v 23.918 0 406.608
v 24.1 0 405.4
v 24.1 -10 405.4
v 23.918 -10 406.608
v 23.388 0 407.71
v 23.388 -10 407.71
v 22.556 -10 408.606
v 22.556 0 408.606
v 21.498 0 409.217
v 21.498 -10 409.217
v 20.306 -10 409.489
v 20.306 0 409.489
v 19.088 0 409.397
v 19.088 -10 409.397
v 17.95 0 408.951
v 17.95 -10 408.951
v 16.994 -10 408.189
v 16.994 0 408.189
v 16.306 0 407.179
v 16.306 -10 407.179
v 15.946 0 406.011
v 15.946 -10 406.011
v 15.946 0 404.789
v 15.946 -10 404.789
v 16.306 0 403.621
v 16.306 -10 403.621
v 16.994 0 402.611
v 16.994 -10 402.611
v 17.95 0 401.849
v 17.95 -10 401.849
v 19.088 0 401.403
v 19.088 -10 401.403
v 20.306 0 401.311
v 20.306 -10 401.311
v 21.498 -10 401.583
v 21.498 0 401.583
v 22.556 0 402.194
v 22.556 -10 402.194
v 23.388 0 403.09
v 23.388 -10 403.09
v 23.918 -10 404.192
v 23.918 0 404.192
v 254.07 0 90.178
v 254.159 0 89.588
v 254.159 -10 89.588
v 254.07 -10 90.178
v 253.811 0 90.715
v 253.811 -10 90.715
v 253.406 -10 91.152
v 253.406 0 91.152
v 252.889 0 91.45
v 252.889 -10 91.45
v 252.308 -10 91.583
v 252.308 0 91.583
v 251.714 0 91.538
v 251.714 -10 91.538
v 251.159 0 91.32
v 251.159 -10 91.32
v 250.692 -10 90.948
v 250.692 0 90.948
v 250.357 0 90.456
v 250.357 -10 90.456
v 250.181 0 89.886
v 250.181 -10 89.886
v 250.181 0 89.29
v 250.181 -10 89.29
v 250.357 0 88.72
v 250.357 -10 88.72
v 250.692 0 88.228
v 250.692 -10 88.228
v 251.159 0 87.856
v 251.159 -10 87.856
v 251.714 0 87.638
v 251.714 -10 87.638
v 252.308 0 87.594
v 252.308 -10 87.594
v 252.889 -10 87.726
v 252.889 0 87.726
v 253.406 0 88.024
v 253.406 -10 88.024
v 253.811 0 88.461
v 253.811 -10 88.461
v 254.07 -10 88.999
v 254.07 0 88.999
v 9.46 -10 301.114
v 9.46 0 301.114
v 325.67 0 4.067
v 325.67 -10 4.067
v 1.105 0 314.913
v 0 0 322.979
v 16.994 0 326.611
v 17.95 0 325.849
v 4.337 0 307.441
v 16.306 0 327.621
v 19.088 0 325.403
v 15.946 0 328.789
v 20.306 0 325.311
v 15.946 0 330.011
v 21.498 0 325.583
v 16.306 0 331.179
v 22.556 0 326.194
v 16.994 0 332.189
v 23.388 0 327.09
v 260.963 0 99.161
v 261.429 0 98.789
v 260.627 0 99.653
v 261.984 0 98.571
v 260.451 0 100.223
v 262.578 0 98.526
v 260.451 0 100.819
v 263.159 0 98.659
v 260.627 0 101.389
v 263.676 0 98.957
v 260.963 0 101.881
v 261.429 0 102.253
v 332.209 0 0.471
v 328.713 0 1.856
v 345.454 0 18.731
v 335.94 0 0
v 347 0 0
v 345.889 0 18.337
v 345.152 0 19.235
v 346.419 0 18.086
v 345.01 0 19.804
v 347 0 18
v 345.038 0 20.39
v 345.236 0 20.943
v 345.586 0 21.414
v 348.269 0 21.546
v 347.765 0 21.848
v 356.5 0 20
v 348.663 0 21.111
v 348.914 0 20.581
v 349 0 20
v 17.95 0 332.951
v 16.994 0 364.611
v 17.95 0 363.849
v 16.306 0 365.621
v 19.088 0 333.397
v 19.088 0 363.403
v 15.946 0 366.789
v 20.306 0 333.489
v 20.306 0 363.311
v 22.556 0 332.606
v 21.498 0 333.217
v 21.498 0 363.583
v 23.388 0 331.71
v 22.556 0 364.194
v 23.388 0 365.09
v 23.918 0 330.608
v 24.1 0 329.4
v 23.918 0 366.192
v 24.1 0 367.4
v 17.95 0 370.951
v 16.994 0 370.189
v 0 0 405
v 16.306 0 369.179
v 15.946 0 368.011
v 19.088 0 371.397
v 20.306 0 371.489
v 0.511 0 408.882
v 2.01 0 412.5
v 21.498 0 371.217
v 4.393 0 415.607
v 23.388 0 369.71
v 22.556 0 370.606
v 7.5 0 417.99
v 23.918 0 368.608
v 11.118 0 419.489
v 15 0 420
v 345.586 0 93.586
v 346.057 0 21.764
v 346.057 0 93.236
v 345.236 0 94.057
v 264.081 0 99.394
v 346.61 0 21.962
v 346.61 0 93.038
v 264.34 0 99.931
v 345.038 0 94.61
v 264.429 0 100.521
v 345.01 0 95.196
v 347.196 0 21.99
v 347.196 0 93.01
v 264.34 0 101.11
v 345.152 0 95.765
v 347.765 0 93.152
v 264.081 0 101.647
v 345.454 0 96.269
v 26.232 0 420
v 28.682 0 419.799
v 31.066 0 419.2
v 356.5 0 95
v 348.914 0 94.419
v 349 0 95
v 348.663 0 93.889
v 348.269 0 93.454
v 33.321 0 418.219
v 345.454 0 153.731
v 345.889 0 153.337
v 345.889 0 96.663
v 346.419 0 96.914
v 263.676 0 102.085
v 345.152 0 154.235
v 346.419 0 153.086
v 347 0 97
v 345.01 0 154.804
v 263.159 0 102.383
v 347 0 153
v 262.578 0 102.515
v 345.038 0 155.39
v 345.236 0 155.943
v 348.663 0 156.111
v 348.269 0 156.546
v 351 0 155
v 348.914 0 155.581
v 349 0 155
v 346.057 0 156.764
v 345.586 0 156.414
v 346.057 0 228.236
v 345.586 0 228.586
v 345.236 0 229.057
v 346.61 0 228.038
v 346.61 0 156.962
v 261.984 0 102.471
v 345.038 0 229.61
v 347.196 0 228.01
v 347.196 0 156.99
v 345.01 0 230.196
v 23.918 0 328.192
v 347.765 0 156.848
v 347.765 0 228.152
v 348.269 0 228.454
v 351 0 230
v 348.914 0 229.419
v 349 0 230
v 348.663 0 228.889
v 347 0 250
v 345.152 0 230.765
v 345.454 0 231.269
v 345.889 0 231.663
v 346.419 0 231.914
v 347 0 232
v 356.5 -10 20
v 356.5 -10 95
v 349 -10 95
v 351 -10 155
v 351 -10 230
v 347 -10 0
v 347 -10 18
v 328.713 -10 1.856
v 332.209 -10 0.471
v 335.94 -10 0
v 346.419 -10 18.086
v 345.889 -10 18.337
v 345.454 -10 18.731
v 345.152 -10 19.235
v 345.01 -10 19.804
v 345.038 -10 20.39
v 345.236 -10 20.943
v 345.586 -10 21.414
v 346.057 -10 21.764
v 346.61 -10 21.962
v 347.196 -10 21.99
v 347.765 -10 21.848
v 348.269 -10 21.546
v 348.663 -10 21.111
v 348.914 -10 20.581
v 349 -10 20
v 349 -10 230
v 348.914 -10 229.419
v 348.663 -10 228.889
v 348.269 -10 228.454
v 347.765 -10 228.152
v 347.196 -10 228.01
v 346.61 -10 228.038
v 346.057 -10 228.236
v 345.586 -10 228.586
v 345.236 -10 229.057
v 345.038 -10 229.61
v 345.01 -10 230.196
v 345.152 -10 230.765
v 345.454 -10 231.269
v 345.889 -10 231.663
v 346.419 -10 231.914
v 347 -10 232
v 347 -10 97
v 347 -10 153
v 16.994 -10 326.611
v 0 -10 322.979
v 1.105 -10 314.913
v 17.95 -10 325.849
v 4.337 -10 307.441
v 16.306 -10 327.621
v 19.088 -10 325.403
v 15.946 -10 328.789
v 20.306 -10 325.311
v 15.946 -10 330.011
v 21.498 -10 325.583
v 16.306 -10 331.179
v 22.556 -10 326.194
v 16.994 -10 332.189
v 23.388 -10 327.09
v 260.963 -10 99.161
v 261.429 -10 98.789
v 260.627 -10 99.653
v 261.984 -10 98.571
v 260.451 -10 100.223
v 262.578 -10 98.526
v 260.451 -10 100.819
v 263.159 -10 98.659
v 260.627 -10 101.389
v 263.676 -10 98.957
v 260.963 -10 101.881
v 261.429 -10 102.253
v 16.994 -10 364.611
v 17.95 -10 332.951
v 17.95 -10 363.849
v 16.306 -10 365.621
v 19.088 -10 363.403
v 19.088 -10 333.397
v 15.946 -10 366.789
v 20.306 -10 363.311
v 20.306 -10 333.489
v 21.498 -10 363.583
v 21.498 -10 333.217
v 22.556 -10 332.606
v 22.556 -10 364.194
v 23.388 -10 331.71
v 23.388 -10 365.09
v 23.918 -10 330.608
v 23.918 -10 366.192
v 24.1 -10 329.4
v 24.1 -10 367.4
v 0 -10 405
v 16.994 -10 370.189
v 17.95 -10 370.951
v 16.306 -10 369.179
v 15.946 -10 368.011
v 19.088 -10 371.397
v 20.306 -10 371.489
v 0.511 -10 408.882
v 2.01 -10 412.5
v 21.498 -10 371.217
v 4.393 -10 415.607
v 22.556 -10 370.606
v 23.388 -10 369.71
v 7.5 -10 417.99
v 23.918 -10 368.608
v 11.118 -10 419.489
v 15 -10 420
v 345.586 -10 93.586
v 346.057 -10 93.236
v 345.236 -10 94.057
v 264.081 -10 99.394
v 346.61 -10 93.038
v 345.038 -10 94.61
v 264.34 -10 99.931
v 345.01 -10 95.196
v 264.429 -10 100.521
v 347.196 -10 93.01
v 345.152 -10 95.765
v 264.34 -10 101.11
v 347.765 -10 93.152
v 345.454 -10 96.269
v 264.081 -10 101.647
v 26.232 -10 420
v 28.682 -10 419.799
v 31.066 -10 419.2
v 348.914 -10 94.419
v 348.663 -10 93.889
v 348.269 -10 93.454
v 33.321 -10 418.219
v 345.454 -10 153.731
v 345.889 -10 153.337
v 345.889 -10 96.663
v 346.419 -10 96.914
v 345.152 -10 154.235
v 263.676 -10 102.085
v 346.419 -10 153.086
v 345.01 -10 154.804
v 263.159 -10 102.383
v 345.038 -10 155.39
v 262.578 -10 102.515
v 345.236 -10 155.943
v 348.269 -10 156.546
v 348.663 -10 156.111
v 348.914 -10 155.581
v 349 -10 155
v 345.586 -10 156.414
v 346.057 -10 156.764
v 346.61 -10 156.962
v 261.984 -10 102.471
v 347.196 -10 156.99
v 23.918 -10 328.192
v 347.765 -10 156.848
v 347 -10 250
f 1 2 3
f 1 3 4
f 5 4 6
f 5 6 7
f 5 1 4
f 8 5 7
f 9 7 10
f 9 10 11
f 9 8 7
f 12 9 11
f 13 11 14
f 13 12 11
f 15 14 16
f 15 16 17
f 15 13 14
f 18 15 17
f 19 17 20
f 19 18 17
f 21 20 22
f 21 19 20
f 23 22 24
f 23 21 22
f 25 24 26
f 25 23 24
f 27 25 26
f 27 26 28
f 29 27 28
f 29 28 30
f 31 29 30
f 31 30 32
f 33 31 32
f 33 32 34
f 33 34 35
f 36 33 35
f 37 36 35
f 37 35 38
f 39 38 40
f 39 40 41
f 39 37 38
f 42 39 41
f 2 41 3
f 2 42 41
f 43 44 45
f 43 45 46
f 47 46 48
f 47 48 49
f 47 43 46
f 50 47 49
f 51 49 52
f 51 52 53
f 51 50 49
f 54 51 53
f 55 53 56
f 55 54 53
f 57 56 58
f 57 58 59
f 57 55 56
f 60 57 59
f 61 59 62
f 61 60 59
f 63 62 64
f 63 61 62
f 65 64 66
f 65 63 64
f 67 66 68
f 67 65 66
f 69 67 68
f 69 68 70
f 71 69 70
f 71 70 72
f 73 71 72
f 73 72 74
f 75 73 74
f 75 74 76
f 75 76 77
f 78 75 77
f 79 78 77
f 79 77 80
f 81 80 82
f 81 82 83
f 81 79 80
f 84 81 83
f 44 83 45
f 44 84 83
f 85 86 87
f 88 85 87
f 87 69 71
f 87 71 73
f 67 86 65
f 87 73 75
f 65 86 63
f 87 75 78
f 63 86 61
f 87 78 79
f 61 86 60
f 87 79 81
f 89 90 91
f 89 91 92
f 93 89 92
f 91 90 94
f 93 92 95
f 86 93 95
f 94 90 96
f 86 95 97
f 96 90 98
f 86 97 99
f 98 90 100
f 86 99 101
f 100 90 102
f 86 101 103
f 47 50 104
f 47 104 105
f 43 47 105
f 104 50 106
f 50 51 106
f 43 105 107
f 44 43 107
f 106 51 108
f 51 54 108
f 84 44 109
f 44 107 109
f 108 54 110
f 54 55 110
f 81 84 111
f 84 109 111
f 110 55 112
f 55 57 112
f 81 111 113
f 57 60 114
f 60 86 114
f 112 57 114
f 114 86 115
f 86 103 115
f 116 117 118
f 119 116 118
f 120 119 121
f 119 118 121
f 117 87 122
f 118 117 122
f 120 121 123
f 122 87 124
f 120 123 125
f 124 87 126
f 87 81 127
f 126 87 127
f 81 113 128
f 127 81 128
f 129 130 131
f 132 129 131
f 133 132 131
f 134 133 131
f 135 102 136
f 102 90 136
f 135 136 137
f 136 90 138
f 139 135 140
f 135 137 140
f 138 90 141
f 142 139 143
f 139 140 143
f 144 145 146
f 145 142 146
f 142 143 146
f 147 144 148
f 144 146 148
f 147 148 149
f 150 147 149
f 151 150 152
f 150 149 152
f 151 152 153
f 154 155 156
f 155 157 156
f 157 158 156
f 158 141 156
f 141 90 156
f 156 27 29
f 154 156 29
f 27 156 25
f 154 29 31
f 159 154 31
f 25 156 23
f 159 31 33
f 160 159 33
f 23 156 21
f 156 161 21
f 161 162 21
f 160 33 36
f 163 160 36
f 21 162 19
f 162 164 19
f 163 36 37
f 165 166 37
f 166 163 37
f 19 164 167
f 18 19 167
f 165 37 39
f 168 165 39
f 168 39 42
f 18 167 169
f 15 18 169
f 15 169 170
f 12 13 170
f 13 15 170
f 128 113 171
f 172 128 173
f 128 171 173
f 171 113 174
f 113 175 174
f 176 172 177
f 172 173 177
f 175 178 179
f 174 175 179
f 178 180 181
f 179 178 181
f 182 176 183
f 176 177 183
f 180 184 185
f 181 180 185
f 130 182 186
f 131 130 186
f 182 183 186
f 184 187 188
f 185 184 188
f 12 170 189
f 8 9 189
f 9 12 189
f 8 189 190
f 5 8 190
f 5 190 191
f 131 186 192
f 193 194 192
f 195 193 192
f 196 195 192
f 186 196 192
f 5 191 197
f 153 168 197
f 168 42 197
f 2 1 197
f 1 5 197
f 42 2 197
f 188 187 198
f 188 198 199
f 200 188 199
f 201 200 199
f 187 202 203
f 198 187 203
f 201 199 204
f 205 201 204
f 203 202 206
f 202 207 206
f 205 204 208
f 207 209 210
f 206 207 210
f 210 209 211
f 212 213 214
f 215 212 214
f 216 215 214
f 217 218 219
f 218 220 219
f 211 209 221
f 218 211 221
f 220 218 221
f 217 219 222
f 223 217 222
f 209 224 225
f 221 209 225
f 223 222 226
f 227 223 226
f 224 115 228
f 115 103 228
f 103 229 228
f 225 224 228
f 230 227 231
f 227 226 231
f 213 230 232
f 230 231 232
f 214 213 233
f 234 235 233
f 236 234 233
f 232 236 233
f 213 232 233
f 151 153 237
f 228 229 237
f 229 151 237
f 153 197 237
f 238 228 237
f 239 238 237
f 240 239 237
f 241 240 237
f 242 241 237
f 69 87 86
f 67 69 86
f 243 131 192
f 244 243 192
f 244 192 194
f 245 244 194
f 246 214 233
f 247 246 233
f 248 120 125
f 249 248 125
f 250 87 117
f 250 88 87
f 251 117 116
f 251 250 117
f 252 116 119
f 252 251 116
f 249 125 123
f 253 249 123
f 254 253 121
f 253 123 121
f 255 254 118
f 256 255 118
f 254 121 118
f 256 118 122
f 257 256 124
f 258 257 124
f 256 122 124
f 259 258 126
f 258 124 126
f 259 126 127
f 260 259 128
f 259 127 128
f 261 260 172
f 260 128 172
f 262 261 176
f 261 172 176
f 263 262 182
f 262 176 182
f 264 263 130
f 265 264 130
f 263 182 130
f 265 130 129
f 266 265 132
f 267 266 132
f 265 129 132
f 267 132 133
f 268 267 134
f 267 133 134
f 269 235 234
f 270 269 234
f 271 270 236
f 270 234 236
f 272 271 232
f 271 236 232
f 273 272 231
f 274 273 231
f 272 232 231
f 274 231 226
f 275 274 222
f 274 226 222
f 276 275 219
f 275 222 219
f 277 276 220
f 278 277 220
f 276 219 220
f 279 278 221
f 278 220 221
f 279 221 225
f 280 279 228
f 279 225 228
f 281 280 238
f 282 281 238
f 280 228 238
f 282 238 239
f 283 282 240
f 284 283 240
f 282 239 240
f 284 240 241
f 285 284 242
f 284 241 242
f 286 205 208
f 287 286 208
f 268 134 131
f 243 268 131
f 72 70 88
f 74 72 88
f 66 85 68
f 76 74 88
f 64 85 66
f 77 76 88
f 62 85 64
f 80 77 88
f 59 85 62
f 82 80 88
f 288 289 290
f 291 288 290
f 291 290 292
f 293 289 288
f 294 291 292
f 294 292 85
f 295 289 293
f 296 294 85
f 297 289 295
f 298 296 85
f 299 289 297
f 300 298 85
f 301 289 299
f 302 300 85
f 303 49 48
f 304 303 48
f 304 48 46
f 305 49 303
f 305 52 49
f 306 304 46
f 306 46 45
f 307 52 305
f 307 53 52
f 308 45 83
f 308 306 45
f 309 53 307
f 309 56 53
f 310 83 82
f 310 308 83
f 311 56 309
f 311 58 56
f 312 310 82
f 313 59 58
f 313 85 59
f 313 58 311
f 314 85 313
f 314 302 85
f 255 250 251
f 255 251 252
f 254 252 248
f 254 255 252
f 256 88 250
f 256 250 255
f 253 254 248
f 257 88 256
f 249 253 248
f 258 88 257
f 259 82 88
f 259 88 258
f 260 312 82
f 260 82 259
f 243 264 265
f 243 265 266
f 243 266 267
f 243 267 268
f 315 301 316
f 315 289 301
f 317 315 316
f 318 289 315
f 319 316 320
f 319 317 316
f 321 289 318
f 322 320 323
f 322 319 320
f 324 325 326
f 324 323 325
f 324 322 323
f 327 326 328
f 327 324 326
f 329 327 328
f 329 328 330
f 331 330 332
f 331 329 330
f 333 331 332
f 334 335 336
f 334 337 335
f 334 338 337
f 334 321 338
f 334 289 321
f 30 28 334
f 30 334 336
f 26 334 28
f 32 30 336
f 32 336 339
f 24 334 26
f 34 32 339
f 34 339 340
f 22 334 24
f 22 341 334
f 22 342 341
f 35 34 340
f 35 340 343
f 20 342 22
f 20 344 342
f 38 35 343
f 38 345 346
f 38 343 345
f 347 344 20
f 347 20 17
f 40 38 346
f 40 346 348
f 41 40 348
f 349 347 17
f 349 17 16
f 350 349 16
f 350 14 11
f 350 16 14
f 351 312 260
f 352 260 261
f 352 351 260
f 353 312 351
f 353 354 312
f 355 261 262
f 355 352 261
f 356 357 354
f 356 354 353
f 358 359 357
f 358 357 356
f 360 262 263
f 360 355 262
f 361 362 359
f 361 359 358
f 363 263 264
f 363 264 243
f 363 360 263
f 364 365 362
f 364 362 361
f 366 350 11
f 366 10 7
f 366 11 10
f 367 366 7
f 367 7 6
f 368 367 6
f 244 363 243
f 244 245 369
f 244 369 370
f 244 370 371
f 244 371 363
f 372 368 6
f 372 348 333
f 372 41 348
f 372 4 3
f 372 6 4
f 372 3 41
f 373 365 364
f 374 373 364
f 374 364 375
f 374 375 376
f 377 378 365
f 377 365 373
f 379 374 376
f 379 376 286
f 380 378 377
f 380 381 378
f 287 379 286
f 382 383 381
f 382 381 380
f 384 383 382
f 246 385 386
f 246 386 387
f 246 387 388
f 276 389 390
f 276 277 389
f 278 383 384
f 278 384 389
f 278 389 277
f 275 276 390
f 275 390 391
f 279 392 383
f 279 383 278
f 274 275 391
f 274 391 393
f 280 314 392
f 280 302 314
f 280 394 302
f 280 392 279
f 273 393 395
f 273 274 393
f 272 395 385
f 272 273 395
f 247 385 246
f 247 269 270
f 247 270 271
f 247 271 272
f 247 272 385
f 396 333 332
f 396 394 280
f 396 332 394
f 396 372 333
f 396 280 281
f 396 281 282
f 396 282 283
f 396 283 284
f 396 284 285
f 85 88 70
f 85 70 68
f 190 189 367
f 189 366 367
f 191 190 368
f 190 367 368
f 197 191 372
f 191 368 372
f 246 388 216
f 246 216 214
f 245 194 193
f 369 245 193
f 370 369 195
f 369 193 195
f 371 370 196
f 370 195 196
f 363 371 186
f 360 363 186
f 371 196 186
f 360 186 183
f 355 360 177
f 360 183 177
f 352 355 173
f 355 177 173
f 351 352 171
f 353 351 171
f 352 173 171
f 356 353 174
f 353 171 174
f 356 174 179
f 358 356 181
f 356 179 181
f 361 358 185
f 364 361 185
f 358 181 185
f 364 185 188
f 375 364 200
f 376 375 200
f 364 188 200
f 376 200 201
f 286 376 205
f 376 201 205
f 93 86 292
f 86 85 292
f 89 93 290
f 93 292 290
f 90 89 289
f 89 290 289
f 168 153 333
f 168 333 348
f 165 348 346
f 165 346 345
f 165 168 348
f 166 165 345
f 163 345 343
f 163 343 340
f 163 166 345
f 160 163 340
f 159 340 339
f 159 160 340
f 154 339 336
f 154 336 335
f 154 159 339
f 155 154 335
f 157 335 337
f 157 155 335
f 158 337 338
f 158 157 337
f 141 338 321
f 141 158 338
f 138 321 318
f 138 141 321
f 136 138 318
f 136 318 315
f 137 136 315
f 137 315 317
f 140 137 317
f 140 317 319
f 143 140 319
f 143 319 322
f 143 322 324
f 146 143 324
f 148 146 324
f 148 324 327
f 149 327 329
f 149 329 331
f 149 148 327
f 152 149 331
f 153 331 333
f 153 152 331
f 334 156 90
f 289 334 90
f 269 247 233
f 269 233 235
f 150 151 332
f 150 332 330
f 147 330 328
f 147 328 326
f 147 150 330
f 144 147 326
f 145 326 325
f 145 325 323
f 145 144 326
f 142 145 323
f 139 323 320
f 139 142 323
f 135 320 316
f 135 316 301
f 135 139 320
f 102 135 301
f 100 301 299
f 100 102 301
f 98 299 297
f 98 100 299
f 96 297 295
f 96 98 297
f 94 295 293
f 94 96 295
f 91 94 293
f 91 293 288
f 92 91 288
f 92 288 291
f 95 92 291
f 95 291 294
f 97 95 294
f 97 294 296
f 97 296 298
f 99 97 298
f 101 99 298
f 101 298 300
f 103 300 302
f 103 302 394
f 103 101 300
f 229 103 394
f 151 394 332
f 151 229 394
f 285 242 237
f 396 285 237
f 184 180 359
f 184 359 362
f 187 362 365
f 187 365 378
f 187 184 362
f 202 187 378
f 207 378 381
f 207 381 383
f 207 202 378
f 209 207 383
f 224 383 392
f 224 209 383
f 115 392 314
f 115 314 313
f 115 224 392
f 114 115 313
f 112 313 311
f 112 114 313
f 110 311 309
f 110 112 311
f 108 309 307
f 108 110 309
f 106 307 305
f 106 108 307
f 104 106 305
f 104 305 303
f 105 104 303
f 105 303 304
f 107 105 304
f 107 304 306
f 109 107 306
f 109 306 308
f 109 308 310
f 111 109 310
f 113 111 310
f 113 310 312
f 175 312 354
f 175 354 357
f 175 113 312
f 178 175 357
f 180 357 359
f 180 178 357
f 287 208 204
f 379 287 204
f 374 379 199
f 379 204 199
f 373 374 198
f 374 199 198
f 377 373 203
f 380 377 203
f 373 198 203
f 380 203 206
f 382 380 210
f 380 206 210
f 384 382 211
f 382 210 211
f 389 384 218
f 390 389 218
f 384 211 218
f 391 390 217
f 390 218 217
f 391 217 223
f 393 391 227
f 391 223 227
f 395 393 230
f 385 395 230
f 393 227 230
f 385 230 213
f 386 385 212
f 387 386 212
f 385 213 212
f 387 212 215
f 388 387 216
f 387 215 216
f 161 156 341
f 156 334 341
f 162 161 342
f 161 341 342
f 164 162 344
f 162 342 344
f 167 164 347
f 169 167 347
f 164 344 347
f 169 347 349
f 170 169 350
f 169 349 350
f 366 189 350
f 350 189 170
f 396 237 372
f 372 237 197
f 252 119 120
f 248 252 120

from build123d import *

# Parameters (mm, degrees)
F0_R     = 2
F0_R_2   = 4.1
F1_DEPTH = 10
F2_R     = 30
F3_R     = 15


with BuildPart() as f1:
    # F0 (on Front) → F1 (new body)
    with BuildSketch(Plane.XZ):
        with BuildLine():
            Line((0, 310), (330, 0))
            Line((330, 0), (347, 0))
            Line((347, 0), (347, 18))
            ThreePointArc((347, 18), (345.585786, 21.414214), (349, 20))
            Line((349, 20), (356.5, 20))
            Line((356.5, 20), (356.5, 95))
            Line((356.5, 95), (349, 95))
            ThreePointArc((349, 95), (345.585786, 93.585786), (347, 97))
            Line((347, 97), (347, 153))
            ThreePointArc((347, 153), (345.585786, 156.414214), (349, 155))
            Line((349, 155), (351, 155))
            Line((351, 155), (351, 230))
            Line((351, 230), (349, 230))
            ThreePointArc((349, 230), (345.585786, 228.585786), (347, 232))
            Line((347, 232), (347, 250))
            Line((347, 250), (30, 420))
            Line((30, 420), (0, 420))
            Line((0, 420), (0, 310))
        make_face()
        with Locations((252.158545, 89.588128)):
            Circle(F0_R, mode=Mode.SUBTRACT)
        with Locations((262.428676, 100.520849)):
            Circle(F0_R, mode=Mode.SUBTRACT)
        with Locations((20, 329.4)):
            Circle(F0_R_2, mode=Mode.SUBTRACT)
        with Locations((20, 367.4)):
            Circle(F0_R_2, mode=Mode.SUBTRACT)
        with Locations((20, 405.4)):
            Circle(F0_R_2, mode=Mode.SUBTRACT)
    extrude(amount=F1_DEPTH)

    # F2
    f2_edges = [f1.edges().sort_by_distance(p)[0] for p in [
        (0, -5, 310),
    ]]
    fillet(f2_edges, radius=F2_R)

    # F3
    f3_edges = [f1.edges().sort_by_distance(p)[0] for p in [
        (0, -5, 420),
        (30, -5, 420),
        (330, -5, 0),
    ]]
    fillet(f3_edges, radius=F3_R)


solid = f1.part
